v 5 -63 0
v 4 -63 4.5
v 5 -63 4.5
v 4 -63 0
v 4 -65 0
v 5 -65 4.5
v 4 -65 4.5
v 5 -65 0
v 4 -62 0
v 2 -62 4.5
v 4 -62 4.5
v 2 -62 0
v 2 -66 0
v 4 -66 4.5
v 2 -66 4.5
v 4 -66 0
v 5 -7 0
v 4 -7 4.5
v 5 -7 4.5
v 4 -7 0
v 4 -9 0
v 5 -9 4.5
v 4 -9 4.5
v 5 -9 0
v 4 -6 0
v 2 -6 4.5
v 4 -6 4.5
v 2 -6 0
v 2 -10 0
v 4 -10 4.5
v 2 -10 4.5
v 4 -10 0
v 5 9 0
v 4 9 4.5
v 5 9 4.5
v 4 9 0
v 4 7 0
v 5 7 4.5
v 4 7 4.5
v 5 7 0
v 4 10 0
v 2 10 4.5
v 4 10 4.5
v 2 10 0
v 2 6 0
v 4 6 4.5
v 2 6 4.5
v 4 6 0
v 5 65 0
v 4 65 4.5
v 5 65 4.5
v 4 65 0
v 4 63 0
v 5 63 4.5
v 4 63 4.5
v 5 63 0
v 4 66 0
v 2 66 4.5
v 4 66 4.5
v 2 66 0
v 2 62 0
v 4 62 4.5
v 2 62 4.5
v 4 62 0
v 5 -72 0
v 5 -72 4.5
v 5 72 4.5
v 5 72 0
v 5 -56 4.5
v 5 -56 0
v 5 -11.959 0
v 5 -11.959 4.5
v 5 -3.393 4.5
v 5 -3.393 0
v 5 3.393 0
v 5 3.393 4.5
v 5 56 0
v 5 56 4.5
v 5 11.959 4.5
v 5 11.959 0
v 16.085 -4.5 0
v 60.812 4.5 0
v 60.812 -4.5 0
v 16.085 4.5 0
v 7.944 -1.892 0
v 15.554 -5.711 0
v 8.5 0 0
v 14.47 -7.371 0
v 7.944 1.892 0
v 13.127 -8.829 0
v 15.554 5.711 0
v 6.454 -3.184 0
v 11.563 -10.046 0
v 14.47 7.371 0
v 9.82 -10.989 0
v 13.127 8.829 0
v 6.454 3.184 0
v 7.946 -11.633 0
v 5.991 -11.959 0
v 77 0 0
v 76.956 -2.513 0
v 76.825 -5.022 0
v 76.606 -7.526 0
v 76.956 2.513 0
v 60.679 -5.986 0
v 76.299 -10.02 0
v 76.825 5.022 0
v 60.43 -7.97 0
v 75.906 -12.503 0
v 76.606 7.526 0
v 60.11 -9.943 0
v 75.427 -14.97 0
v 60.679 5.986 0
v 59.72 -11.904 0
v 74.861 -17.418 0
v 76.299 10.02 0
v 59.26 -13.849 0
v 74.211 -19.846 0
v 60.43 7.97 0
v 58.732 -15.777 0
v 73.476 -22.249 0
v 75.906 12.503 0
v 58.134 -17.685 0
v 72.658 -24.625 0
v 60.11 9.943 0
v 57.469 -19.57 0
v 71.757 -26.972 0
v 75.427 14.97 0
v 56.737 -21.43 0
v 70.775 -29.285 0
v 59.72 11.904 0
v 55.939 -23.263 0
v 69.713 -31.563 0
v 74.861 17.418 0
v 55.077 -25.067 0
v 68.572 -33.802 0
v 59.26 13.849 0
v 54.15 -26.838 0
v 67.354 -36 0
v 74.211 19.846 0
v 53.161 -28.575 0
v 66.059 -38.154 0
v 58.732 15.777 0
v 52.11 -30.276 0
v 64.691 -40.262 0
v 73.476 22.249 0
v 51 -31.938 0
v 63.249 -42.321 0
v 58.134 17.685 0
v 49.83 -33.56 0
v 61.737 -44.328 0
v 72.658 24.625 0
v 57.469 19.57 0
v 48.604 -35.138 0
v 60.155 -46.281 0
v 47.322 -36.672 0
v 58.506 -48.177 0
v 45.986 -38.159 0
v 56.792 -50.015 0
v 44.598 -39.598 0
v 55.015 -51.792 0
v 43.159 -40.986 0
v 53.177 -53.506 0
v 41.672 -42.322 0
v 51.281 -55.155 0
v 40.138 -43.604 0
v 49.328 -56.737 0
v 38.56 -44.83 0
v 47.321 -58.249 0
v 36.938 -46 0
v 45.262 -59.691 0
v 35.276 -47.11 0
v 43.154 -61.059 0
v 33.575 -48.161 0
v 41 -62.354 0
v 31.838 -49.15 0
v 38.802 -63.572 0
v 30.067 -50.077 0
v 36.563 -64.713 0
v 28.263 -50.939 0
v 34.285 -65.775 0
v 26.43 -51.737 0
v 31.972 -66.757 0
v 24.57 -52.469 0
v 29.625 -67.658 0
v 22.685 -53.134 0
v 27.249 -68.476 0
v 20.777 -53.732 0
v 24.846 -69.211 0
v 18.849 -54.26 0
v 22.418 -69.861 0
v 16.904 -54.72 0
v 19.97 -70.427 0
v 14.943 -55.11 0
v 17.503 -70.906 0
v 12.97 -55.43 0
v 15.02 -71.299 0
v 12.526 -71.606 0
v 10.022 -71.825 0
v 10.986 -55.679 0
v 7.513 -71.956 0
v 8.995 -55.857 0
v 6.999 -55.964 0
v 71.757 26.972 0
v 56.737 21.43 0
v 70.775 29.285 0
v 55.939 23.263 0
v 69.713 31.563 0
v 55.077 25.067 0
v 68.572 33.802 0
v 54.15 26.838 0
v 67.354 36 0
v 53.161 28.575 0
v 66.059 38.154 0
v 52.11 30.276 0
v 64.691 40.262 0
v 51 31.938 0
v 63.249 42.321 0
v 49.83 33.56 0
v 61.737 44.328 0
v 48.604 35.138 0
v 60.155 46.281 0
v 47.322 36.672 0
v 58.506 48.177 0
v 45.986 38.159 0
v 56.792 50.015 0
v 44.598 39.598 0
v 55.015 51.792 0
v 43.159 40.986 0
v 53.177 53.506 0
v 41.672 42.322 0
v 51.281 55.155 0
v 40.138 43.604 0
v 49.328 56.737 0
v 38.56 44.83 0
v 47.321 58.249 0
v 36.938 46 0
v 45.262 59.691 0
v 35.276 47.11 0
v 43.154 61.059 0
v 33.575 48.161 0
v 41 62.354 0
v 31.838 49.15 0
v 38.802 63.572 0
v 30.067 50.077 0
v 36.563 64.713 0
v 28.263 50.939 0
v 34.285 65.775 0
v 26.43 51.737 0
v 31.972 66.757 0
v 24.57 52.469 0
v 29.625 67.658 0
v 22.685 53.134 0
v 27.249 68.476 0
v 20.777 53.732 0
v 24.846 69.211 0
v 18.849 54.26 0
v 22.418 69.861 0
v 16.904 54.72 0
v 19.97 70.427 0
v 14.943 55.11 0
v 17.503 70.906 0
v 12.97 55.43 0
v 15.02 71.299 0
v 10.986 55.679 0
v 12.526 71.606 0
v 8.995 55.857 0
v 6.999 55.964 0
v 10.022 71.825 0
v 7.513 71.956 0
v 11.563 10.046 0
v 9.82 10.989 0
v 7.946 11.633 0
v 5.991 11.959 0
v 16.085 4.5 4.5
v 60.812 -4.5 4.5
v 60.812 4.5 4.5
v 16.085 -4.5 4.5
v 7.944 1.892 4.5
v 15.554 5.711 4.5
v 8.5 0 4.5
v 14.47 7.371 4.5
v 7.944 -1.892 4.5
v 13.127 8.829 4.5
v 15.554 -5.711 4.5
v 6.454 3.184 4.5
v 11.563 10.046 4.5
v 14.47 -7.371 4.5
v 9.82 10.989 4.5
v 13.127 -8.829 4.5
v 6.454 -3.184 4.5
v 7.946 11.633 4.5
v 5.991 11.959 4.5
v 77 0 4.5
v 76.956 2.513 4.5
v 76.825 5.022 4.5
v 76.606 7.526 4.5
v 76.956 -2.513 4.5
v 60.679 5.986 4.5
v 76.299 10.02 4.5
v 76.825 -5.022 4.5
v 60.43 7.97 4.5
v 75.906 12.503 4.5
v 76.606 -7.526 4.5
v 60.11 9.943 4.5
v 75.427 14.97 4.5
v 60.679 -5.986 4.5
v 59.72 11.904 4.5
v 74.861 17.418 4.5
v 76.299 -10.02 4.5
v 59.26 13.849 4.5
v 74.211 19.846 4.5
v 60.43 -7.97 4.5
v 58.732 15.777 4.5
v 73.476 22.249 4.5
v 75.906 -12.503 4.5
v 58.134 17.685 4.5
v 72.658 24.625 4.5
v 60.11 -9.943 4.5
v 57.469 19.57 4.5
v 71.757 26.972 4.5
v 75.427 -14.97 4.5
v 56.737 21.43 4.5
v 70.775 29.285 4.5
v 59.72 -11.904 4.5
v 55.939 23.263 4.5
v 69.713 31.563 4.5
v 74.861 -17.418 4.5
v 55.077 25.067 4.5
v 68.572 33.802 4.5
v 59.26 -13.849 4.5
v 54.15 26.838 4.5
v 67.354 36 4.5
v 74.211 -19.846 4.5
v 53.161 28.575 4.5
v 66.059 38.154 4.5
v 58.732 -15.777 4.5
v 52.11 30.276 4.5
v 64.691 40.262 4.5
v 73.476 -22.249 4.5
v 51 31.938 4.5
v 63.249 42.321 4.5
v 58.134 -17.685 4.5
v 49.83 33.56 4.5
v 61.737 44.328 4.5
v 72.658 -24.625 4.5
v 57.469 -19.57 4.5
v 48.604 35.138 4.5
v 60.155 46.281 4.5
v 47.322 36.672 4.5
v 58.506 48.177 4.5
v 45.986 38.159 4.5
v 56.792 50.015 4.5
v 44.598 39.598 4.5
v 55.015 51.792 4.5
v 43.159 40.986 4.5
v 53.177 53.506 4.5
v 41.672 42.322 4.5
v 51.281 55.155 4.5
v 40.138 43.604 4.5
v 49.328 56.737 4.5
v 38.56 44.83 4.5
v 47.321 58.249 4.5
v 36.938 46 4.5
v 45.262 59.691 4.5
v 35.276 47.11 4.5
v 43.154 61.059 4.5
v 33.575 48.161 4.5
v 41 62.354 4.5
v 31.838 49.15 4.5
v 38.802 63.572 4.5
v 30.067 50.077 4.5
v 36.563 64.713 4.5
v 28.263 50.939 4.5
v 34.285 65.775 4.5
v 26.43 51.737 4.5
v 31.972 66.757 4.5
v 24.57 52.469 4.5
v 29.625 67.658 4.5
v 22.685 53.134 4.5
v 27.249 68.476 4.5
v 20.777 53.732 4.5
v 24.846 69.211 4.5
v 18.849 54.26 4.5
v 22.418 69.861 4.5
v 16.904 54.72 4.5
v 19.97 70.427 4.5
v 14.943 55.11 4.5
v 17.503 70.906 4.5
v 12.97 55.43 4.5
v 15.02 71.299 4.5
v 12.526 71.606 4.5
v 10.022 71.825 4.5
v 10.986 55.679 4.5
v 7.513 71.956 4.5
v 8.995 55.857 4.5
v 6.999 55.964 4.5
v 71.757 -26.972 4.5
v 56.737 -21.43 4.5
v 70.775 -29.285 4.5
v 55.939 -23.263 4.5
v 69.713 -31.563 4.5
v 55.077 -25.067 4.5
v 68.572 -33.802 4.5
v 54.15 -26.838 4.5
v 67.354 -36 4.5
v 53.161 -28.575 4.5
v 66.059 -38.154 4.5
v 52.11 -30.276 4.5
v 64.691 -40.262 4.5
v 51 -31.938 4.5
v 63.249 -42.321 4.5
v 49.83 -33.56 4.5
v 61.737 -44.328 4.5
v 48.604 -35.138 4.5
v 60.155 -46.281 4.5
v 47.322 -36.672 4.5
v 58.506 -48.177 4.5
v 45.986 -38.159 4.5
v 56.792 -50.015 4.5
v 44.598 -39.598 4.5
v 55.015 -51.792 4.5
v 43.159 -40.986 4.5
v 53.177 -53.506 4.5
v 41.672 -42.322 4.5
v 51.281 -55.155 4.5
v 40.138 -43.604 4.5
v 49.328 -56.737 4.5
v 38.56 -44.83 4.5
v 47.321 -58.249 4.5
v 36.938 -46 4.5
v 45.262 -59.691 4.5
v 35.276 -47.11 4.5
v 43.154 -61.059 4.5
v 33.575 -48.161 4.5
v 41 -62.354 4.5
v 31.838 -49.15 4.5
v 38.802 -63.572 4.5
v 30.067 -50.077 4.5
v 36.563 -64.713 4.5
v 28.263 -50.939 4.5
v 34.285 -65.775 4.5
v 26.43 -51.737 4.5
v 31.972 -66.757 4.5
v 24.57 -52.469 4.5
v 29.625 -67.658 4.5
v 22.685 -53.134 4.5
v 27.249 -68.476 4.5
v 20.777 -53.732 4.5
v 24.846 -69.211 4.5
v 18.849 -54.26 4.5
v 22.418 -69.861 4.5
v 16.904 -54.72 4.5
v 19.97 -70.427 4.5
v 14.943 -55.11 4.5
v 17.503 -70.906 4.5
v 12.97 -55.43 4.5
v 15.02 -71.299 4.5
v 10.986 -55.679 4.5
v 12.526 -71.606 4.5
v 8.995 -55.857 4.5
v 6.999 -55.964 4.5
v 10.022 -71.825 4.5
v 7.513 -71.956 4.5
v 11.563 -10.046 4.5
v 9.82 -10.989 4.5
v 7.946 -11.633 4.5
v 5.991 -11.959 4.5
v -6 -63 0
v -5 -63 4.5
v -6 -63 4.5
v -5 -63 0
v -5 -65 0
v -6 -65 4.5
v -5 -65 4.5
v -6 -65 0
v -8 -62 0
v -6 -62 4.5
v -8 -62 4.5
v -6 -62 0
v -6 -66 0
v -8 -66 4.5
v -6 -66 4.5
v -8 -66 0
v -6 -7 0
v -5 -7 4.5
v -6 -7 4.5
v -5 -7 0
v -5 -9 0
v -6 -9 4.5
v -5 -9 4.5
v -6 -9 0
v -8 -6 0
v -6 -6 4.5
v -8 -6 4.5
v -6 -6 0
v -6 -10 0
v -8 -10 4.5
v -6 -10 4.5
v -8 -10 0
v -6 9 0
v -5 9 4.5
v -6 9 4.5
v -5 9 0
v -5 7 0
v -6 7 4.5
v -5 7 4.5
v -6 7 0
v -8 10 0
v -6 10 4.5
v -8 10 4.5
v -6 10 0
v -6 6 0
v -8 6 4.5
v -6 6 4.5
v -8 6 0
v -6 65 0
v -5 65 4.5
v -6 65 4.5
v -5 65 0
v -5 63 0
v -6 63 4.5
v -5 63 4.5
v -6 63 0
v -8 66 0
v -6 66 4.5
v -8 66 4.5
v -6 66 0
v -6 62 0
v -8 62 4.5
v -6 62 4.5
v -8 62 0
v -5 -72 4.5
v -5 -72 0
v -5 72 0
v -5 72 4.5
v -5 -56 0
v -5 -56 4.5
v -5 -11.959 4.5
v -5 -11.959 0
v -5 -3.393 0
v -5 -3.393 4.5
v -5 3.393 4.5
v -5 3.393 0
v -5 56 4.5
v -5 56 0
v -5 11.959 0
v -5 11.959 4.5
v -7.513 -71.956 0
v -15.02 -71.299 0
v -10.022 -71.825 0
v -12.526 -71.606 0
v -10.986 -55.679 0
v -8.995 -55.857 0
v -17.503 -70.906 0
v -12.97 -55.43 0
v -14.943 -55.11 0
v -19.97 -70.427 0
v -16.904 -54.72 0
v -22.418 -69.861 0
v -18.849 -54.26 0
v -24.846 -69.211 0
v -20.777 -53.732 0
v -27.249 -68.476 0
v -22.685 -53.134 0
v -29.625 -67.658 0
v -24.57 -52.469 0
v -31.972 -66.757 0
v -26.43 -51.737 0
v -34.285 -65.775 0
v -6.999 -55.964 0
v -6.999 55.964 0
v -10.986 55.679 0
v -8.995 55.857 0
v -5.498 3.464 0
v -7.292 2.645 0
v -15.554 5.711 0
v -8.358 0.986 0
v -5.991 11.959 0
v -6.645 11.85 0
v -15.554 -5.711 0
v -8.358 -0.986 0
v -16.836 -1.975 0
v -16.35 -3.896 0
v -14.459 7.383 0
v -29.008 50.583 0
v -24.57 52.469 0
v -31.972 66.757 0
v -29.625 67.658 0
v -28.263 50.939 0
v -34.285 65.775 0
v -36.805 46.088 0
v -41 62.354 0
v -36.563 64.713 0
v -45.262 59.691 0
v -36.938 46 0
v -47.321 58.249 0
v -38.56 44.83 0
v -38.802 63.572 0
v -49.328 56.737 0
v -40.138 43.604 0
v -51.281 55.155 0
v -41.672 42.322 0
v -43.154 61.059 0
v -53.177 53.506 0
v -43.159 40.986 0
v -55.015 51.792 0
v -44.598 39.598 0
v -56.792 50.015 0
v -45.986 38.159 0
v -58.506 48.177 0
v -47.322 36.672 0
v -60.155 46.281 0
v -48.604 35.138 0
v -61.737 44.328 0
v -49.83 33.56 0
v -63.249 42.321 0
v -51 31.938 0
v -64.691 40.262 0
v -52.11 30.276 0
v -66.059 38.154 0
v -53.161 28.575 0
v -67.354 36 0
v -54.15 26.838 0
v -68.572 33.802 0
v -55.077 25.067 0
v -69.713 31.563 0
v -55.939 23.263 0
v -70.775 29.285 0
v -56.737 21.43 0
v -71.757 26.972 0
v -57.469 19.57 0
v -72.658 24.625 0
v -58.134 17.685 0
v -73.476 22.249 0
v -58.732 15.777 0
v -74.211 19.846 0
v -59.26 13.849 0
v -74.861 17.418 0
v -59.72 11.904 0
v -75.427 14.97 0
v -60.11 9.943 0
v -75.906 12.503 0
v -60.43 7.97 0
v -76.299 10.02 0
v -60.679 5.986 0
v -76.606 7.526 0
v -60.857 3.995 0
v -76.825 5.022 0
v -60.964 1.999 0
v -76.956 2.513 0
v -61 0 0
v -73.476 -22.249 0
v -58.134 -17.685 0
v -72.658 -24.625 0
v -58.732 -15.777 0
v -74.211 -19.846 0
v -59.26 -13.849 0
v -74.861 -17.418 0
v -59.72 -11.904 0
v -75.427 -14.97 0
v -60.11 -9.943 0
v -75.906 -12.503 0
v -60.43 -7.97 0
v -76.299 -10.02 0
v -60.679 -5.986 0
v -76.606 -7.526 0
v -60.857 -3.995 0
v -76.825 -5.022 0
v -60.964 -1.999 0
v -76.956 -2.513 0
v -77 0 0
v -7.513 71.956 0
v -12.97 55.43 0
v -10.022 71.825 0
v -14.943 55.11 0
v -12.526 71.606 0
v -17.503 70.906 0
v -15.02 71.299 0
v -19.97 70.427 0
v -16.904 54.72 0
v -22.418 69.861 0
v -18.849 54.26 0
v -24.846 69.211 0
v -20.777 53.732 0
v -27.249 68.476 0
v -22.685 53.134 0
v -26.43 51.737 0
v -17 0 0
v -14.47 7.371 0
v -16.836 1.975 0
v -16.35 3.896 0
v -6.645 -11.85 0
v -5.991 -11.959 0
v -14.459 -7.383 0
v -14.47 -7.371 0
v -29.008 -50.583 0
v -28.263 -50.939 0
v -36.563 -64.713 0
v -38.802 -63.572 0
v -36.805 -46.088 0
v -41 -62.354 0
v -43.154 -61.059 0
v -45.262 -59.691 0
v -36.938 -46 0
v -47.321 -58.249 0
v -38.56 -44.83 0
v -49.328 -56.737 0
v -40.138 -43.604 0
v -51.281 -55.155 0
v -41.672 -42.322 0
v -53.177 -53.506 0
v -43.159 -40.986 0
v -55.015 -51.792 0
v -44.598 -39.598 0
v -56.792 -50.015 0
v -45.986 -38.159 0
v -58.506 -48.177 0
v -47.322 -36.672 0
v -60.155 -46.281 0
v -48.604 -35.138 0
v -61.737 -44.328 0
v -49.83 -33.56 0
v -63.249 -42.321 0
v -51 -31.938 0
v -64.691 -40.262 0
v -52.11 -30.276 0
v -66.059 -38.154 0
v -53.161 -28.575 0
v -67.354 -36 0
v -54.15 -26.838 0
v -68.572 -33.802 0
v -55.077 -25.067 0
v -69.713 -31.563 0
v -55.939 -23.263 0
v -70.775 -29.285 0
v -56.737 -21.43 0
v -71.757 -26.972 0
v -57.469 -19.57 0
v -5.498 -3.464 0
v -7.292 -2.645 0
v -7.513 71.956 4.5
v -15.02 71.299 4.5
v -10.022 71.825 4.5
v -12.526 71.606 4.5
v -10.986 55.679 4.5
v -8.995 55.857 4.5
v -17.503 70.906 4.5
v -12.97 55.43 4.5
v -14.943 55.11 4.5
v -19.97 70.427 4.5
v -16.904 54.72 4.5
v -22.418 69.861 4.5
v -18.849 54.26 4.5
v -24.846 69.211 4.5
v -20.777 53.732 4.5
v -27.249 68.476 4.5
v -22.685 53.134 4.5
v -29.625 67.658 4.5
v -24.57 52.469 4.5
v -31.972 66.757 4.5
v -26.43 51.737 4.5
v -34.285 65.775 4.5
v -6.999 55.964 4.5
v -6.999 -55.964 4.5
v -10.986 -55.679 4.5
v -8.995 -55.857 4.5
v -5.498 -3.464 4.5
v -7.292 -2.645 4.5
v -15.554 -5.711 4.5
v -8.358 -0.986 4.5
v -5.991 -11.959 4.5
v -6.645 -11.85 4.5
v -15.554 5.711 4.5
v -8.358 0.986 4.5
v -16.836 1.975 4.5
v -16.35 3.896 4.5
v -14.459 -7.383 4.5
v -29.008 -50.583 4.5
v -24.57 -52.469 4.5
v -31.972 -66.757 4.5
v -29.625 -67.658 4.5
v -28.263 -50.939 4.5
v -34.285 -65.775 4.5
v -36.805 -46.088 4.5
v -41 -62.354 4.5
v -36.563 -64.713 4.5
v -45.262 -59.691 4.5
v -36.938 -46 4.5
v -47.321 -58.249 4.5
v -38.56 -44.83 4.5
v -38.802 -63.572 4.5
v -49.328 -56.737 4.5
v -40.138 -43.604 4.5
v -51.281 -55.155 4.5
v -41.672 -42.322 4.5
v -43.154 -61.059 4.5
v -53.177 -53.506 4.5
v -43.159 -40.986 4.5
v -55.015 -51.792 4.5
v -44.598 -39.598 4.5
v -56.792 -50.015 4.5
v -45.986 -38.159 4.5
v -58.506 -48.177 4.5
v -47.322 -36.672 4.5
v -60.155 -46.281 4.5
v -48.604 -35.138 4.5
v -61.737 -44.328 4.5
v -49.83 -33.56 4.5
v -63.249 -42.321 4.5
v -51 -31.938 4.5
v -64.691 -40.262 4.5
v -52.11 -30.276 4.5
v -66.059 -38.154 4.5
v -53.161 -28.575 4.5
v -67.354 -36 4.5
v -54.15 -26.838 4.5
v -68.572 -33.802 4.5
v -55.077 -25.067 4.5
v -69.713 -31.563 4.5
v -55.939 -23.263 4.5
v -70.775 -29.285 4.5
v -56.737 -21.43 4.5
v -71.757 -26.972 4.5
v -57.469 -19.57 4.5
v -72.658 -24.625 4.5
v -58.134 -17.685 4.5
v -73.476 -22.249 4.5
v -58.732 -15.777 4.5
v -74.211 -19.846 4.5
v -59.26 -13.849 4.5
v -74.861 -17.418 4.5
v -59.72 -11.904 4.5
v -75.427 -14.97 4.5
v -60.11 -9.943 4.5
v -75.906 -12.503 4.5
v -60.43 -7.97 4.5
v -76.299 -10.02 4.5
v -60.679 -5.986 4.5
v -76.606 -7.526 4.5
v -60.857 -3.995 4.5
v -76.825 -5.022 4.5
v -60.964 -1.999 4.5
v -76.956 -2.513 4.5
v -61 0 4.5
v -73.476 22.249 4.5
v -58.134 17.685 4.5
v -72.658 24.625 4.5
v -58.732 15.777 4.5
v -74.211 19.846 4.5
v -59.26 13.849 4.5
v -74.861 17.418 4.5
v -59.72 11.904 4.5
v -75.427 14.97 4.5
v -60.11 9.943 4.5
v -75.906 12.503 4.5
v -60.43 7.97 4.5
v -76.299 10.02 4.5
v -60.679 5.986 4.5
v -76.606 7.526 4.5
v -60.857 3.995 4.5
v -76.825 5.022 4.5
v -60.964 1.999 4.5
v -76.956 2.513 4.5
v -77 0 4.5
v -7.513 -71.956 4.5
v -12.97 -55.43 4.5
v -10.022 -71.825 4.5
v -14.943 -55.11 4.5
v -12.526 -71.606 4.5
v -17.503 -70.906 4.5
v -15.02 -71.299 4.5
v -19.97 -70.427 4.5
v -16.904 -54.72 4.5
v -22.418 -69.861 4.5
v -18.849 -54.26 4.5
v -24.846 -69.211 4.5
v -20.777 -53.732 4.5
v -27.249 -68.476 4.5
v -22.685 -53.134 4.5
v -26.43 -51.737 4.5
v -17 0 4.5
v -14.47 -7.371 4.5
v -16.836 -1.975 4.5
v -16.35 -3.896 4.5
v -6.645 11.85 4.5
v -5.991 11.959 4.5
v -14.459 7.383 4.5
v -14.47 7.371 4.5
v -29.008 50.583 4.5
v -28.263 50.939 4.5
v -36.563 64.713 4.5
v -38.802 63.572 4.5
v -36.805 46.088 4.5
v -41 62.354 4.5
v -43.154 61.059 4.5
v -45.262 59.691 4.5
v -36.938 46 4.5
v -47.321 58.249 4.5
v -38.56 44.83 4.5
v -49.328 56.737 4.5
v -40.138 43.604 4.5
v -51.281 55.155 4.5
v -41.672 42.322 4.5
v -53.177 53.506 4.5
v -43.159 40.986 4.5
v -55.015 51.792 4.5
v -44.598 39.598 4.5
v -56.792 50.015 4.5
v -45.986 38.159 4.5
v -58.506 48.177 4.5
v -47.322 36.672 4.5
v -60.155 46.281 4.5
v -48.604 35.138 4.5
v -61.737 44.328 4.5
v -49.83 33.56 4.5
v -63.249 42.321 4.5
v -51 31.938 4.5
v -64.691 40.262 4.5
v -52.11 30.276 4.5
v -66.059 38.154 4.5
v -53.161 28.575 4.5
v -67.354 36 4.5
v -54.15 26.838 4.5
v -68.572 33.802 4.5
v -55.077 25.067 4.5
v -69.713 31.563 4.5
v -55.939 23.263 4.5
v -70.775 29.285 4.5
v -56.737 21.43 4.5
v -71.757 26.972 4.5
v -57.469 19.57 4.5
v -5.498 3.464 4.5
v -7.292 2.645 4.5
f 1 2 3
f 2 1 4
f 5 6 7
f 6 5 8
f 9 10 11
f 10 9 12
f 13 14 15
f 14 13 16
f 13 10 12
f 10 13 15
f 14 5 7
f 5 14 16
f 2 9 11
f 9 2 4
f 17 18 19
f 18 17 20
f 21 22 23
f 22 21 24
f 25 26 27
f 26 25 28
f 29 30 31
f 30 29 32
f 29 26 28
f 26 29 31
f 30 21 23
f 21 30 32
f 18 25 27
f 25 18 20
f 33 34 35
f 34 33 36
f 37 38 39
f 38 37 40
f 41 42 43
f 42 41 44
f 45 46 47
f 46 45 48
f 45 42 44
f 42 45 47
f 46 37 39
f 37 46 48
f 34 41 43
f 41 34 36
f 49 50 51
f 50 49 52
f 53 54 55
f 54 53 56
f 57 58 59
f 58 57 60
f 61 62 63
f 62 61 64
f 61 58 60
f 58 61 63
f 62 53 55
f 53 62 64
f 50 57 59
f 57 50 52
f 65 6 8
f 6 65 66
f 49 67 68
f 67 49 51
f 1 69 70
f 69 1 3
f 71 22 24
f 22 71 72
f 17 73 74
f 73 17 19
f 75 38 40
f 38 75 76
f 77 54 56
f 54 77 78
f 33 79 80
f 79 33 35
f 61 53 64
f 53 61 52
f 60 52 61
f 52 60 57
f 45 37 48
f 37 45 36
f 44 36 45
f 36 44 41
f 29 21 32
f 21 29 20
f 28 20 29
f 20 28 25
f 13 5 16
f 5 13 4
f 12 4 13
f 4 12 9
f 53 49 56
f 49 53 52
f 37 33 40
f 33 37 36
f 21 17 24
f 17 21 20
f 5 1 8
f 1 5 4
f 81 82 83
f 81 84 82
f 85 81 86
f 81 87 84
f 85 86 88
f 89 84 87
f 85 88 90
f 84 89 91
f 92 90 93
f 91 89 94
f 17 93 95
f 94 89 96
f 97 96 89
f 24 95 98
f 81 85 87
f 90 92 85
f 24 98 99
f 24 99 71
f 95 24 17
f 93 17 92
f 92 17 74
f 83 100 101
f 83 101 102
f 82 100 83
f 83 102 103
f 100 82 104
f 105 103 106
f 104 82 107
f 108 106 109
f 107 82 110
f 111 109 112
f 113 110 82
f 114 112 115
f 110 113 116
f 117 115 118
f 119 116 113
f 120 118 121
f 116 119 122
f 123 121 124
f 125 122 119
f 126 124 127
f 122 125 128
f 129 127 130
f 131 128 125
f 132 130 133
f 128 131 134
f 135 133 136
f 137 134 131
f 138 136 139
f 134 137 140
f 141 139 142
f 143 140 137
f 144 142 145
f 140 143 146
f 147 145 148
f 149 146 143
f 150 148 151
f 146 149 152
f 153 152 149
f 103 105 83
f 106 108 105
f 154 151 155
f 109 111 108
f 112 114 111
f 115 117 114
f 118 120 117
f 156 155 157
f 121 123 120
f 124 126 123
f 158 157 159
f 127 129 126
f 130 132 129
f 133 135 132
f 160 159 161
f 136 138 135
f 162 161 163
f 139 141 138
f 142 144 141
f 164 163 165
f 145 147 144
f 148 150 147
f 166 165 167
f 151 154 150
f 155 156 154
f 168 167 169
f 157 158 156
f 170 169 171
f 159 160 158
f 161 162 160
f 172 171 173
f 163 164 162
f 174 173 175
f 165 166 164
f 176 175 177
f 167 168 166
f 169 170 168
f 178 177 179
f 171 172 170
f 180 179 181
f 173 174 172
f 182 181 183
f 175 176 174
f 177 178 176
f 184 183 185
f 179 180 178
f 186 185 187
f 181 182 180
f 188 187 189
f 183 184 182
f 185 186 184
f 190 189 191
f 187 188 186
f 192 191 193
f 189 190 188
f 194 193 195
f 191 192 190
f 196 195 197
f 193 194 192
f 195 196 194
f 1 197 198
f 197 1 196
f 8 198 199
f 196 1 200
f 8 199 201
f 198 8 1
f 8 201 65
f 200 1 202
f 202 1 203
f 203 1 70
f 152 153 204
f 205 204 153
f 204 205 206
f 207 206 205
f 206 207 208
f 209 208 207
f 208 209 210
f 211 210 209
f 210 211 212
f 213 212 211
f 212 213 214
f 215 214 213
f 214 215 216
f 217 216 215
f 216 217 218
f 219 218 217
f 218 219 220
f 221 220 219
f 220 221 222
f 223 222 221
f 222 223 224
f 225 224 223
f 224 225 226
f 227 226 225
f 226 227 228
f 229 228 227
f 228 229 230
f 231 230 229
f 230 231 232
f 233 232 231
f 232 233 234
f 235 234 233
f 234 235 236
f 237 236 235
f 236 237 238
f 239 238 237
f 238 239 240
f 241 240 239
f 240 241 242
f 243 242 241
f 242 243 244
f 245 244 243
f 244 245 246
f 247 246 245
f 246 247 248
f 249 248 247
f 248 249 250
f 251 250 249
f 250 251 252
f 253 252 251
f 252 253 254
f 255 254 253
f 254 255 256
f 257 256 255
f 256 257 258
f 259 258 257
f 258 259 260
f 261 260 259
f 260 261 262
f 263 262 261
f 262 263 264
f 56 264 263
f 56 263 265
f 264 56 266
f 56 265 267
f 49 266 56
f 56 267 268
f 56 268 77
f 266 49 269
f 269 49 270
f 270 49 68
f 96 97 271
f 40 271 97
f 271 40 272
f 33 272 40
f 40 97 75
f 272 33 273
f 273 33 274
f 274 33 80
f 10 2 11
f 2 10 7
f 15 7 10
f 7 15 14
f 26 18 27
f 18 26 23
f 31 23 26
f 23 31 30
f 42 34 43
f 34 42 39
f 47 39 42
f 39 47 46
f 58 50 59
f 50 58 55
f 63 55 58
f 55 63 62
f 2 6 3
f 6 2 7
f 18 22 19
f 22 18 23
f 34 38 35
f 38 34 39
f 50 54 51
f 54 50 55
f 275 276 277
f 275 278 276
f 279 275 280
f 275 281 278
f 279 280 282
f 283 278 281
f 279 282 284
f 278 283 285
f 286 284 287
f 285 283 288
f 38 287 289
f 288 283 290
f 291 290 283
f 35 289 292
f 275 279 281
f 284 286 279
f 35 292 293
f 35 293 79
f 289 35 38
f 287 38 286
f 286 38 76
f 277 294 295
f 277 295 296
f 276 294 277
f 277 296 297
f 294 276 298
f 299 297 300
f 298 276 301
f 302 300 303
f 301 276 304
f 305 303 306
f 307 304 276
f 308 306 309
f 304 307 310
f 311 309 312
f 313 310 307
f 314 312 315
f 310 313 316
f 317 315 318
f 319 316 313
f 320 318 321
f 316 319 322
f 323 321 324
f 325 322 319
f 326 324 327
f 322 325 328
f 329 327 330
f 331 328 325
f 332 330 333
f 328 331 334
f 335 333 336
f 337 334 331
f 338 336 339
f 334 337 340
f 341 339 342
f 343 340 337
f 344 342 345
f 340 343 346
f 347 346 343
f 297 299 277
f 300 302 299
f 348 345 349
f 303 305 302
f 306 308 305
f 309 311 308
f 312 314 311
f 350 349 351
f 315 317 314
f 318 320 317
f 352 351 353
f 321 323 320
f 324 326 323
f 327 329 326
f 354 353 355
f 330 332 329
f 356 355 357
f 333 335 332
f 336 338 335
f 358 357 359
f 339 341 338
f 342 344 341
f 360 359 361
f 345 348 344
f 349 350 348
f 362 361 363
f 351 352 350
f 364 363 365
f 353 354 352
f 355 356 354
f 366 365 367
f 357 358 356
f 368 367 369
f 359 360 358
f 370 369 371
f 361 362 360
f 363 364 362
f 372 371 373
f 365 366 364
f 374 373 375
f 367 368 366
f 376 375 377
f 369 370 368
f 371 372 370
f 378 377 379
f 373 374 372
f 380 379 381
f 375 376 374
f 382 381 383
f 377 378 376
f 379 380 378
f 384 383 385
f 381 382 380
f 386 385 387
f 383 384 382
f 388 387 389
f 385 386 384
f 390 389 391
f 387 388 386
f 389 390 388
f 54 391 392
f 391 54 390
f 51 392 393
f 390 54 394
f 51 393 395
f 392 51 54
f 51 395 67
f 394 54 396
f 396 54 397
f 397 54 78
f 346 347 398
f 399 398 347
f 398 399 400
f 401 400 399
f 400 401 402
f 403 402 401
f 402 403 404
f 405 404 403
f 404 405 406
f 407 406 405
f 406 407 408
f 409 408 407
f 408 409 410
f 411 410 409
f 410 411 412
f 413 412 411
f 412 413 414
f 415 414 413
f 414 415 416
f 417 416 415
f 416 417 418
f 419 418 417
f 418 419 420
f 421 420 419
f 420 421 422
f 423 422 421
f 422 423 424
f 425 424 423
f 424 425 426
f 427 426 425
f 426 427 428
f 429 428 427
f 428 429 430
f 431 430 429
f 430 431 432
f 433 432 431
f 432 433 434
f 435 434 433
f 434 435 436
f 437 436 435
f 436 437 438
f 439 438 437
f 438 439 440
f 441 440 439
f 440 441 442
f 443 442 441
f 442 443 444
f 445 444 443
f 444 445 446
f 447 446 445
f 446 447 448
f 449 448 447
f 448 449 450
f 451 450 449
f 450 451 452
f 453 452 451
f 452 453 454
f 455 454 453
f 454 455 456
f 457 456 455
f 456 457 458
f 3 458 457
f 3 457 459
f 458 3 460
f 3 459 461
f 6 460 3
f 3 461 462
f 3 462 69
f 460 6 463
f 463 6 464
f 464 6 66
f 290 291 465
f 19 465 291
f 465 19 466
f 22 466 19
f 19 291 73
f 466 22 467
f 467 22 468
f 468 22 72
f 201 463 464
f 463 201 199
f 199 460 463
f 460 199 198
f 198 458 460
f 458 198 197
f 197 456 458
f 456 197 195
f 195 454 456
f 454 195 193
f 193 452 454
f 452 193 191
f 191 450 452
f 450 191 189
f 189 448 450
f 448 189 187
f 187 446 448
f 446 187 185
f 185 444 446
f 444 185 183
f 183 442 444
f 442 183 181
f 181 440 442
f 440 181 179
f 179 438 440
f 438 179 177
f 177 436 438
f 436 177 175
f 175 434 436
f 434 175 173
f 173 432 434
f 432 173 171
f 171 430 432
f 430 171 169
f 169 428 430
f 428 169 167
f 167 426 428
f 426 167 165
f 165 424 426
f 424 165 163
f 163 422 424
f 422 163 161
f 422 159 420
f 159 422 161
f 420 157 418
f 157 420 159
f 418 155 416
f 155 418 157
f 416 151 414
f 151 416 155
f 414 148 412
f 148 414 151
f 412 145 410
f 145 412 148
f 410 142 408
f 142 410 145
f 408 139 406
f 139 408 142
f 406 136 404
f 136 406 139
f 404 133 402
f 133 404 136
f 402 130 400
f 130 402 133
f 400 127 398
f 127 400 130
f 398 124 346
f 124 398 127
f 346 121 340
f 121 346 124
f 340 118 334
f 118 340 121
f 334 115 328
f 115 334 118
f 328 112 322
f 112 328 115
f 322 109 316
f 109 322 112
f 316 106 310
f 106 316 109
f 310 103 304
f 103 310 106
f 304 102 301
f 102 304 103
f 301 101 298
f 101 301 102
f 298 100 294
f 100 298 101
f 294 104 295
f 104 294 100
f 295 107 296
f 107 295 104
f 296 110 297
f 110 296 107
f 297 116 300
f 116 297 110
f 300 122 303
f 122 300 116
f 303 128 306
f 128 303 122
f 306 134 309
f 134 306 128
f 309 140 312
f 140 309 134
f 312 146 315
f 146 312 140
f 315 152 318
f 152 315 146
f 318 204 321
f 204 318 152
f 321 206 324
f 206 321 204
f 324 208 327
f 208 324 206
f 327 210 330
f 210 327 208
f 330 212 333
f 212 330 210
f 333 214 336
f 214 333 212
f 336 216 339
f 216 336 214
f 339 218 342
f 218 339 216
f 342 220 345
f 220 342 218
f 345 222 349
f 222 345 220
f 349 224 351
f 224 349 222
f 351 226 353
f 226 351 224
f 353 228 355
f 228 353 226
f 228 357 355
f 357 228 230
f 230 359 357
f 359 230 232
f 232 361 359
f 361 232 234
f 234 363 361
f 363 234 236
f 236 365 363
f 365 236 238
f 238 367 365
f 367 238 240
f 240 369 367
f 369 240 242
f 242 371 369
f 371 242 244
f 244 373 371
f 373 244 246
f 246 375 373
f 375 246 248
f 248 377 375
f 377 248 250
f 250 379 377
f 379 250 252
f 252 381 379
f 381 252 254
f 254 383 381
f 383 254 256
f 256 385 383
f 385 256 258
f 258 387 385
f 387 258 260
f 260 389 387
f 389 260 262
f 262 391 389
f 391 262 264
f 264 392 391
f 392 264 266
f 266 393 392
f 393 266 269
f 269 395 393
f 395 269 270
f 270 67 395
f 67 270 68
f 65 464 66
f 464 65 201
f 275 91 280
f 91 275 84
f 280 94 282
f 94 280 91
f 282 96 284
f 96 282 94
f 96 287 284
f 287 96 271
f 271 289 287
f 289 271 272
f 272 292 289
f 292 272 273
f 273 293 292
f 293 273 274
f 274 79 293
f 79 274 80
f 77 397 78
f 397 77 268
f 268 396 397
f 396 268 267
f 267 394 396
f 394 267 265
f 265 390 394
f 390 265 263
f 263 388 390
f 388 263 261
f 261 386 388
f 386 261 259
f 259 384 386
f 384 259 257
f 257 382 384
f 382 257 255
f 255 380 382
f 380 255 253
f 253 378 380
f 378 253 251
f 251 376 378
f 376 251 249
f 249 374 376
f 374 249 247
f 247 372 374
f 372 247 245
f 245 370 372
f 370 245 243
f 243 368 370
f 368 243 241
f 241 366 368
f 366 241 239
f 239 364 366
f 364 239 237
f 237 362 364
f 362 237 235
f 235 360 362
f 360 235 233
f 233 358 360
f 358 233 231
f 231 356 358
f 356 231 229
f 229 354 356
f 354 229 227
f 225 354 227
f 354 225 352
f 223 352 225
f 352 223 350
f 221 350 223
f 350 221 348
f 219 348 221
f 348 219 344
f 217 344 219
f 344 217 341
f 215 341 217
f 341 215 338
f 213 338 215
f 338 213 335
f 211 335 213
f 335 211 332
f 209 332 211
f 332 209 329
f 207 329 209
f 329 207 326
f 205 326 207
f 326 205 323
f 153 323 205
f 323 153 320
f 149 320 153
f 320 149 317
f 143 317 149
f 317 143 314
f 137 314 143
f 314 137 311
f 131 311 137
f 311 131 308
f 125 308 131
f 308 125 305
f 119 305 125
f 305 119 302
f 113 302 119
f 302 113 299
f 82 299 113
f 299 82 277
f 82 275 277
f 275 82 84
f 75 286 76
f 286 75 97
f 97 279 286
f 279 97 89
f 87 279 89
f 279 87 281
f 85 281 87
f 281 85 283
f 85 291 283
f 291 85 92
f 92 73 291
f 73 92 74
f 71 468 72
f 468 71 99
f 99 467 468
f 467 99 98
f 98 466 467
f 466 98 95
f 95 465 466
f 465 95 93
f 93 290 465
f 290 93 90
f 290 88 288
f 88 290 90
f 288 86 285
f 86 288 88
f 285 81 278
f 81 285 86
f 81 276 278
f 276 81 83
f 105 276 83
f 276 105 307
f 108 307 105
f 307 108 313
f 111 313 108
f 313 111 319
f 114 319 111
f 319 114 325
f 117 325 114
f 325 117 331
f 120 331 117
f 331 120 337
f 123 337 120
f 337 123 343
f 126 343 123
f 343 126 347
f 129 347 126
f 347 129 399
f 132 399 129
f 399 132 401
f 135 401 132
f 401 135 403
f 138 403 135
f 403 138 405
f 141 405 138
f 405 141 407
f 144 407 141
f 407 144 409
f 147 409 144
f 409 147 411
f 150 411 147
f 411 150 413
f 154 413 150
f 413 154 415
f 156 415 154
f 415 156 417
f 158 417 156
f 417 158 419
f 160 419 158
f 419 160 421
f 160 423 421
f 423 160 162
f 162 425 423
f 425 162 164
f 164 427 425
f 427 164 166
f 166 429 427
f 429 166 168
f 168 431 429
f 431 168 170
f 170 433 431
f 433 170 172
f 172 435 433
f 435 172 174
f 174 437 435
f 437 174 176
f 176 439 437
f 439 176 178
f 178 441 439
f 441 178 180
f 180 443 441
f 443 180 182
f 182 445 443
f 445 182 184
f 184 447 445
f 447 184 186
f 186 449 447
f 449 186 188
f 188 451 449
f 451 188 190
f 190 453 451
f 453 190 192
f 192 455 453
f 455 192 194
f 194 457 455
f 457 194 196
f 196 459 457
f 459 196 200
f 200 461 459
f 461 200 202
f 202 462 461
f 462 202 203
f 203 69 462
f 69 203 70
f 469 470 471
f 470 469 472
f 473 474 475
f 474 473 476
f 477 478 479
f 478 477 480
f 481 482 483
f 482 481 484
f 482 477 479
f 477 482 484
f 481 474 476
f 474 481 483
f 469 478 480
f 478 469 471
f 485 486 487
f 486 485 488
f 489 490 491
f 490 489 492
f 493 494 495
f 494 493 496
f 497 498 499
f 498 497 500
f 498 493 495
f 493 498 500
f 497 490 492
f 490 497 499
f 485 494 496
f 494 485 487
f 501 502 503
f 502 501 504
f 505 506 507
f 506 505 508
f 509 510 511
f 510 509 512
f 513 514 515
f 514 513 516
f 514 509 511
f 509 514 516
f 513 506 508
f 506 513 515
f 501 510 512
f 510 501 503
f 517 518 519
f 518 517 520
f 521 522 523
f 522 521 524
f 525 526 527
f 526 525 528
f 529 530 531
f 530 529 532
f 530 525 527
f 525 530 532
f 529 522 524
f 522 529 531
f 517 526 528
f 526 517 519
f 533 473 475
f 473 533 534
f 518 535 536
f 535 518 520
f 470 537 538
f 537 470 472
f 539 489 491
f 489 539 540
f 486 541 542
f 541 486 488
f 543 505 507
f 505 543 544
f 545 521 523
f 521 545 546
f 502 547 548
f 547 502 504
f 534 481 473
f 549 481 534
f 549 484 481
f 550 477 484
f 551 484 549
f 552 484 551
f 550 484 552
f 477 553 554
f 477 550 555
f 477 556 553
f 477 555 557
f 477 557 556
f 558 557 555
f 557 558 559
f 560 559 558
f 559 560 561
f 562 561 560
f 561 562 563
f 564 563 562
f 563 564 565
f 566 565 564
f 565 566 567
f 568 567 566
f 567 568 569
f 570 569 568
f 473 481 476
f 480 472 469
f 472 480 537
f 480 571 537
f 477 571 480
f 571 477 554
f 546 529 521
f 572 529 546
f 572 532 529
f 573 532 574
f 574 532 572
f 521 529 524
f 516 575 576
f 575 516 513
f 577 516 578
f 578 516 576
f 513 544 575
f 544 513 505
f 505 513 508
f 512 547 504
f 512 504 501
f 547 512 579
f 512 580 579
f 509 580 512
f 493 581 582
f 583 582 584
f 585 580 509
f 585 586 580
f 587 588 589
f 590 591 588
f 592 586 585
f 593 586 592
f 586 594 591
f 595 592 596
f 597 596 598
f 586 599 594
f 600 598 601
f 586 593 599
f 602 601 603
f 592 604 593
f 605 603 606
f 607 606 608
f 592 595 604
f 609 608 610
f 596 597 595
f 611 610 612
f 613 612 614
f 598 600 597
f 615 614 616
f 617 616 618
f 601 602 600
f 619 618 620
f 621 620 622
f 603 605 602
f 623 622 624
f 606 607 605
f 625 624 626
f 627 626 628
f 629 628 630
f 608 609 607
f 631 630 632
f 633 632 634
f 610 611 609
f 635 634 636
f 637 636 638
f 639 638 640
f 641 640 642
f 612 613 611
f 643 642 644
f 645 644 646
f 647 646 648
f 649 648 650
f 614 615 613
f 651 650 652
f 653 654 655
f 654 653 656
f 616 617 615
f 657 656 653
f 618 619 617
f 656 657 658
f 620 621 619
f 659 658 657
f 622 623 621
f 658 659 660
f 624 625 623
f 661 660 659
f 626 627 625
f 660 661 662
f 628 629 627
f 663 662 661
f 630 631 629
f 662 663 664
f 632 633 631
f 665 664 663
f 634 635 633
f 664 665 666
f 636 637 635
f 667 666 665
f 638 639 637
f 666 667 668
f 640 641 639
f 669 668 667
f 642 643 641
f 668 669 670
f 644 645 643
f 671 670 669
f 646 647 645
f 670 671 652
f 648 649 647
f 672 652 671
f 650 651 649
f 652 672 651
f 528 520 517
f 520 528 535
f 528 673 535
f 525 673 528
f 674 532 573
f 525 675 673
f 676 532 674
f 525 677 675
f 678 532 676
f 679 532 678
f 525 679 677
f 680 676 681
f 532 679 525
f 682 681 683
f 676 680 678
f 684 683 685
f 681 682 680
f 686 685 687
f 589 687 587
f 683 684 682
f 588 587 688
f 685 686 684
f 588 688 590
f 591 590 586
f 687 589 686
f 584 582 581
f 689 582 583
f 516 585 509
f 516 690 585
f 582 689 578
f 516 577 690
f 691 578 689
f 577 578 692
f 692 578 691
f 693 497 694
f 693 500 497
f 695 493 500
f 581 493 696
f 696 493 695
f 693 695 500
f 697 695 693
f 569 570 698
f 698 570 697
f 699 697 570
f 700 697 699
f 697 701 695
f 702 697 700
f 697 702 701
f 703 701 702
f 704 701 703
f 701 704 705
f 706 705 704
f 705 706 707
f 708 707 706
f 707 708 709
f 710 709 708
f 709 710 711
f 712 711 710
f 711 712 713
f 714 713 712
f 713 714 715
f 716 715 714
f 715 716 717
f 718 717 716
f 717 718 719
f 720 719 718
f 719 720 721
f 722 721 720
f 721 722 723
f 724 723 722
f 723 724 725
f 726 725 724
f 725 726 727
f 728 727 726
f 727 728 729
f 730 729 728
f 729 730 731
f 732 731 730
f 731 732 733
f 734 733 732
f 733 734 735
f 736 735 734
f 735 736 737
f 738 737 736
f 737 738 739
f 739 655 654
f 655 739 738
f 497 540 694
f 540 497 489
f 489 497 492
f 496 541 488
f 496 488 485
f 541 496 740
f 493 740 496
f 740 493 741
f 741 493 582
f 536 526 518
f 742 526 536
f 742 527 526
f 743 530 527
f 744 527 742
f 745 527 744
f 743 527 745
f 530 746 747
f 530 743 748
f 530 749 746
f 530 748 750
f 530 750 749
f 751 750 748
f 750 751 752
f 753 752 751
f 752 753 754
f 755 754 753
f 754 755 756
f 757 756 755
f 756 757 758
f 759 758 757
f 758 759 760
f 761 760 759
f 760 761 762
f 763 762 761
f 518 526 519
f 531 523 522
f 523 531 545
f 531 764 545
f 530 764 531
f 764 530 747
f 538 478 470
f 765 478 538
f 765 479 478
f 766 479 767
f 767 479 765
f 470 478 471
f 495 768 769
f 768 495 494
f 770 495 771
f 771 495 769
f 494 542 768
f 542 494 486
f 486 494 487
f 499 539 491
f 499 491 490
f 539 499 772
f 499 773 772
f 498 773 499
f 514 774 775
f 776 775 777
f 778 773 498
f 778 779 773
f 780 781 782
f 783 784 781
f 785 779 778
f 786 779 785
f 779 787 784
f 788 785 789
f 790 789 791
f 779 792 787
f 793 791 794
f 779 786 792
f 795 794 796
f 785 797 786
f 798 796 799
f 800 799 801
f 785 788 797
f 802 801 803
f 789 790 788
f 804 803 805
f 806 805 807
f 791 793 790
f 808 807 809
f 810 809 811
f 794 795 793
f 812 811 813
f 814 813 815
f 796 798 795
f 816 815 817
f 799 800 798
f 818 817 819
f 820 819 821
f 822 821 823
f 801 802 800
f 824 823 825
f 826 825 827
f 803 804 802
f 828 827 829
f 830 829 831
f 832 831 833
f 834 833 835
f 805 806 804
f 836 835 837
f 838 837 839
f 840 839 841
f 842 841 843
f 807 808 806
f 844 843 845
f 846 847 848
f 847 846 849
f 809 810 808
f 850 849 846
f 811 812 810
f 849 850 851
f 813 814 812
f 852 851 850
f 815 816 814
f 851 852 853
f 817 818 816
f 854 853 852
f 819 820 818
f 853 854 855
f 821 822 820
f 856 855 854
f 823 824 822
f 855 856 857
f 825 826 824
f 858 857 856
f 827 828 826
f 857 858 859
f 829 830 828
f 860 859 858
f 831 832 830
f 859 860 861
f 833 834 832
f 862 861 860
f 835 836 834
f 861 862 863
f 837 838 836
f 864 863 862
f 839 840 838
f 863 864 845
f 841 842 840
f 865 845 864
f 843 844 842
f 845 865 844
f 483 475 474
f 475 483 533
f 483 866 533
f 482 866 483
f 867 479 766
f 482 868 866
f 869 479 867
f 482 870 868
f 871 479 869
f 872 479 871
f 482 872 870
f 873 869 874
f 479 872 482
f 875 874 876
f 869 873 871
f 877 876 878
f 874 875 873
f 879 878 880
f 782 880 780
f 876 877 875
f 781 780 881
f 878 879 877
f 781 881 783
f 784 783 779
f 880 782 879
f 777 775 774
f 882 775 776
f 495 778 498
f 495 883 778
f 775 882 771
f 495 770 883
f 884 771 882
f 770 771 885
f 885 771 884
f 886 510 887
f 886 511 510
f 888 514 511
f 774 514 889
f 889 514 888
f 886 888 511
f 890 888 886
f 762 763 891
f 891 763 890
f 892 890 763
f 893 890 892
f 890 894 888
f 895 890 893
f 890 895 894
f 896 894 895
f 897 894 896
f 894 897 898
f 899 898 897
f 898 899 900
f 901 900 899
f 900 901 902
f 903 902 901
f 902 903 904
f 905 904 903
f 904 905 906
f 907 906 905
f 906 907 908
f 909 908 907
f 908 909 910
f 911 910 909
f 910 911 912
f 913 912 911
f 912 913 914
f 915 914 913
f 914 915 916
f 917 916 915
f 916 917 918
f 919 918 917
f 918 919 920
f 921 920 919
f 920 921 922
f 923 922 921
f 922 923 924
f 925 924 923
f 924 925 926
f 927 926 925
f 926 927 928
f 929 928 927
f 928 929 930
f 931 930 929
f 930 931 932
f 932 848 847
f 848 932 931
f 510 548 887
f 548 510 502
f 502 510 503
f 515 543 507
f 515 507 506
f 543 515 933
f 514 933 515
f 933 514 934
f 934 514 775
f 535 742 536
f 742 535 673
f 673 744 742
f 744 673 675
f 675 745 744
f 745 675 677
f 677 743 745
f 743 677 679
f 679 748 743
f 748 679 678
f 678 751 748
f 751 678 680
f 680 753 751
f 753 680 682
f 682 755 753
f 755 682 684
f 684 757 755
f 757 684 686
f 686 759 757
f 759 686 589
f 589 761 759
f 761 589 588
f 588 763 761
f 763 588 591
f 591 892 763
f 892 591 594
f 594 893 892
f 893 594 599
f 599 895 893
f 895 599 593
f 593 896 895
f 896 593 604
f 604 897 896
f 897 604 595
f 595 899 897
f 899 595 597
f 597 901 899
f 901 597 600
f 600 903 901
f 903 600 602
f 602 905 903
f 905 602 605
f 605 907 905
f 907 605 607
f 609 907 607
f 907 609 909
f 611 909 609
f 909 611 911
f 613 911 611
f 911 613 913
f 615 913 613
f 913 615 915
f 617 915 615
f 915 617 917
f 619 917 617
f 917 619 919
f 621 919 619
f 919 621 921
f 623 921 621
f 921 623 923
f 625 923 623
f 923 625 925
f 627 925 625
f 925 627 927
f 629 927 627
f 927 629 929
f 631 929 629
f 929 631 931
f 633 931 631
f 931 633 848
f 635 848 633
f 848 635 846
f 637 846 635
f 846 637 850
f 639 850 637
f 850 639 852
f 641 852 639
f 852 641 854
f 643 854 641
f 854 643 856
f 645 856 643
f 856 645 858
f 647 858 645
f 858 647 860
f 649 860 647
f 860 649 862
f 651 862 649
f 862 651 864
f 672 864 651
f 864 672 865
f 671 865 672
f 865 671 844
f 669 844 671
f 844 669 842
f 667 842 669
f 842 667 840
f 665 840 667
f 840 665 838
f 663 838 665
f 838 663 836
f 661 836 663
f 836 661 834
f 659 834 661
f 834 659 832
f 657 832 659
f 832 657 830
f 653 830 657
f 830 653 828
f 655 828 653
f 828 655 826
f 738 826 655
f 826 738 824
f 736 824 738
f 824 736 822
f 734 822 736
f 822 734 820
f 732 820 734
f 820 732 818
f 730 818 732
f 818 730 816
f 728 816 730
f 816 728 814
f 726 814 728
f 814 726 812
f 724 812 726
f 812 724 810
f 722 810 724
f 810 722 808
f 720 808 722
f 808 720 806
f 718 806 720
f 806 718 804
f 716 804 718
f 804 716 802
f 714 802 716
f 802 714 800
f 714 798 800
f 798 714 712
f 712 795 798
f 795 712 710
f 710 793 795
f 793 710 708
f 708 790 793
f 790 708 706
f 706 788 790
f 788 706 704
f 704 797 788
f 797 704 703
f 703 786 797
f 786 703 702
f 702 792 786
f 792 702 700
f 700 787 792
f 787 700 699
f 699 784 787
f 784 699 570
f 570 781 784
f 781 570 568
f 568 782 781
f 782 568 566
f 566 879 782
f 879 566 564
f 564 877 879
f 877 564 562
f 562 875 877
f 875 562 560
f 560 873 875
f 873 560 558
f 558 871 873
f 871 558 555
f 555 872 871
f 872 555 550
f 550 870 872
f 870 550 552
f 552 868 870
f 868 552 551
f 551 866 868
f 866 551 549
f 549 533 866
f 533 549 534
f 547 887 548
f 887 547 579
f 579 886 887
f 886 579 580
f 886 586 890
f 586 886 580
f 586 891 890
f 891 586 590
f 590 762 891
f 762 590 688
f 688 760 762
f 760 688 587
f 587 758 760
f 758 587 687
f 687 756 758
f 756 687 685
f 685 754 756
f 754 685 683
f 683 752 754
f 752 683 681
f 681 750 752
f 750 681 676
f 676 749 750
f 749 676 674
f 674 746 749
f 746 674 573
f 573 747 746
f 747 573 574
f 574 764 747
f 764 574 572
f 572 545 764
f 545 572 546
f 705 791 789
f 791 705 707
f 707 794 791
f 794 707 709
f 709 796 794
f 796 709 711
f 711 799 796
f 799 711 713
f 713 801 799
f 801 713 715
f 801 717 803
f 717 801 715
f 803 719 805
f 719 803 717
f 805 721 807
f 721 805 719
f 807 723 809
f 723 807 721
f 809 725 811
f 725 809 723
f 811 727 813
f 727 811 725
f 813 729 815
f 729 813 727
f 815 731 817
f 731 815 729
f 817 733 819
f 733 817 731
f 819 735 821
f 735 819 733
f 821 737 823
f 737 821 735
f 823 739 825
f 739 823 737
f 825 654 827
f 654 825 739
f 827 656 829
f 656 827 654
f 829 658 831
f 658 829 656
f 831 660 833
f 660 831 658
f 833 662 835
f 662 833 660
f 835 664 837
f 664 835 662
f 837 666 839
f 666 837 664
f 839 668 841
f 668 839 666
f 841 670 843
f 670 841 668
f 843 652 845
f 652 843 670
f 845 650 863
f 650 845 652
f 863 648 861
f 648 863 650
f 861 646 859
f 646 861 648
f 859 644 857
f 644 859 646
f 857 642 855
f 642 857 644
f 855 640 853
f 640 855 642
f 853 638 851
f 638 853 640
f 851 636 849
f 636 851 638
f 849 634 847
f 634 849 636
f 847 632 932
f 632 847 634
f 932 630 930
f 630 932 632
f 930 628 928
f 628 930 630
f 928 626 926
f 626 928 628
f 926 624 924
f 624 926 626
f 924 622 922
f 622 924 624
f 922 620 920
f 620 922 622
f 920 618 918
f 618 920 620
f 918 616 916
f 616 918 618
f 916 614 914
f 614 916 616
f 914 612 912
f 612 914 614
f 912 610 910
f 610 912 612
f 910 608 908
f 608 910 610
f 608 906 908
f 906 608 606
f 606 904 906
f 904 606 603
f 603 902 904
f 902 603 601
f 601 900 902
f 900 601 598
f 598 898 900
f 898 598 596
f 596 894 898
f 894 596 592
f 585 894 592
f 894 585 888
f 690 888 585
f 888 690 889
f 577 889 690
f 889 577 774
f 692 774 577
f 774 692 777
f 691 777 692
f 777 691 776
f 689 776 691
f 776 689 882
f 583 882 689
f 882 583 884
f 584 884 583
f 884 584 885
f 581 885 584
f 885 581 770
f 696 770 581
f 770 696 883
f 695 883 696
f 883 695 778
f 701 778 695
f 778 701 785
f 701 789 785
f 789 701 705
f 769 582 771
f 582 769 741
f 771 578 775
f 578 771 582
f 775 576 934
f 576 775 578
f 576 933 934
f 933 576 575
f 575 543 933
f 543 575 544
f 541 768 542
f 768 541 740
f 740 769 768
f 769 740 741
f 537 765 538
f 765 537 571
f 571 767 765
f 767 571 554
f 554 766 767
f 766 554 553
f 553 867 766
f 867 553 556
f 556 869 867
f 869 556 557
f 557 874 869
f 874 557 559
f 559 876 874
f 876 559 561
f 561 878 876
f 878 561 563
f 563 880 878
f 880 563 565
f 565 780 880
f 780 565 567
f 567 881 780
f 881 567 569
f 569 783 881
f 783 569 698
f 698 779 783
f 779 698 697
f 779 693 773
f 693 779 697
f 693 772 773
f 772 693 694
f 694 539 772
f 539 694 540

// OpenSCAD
// file: demoobject.scad
outsideCircle = 72;
platformWidth = 16;
platformDepth = 4.5;
supportBeamWidth = 9;
supportCenterCircleRadius = 12;
centerHoleRadius = 3.5;

$fs = 2;
$fa = 2;

module drawDemoObject()
{

	linear_extrude(height = platformDepth) supportPlatform();

}

module beams()
{
		circle(supportCenterCircleRadius);
		translate ([0,-supportBeamWidth / 2, 0]) square([outsideCircle - platformWidth, supportBeamWidth]);
		rotate ([0,0,120]) translate ([0,-supportBeamWidth / 2, 0]) square([outsideCircle - platformWidth, supportBeamWidth]);
		rotate ([0,0,240]) translate ([0,-supportBeamWidth / 2, 0]) square([outsideCircle - platformWidth, supportBeamWidth]);
}

module supportPlatform()
{
	difference()
	{
		beams();
		circle(centerHoleRadius);
	}
	
	difference()
	{
		circle(outsideCircle);
		circle(outsideCircle - platformWidth);
	}
}
// file: puzzlecutlib.scad
//OpenSCAD PuzzleCut Library Demo - by Rich Olson
//http://www.nothinglabs.com
//Tested on build 2012.08.22
//License: http://creativecommons.org/licenses/by/3.0/


module xMaleCut(offset = 0, cut = xCut1)
{
	difference()
	{
		child(0);	
		translate([0,offset,0]) makePuzzleStamp(cutLocations = cut);
	}
}


module xFemaleCut(offset = 0, cut = xCut1)
{
	intersection()
	{
		child(0);
		translate([0,offset,0]) makePuzzleStamp(cutLocations = cut,
			 kerf = kerf);	//only set kerf on female side
	}
}


module yMaleCut(offset = 0, cut = yCut1)
{
	difference()
	{
		child(0);	
		rotate ([0,0,90]) translate([0,offset,0]) makePuzzleStamp(cutLocations = cut);
	}
}


module yFemaleCut(offset = 0, cut = yCut1)
{
	intersection()
	{
		child(0);
		rotate ([0,0,90]) translate([0,offset,0]) makePuzzleStamp(cutLocations = cut,
			 kerf = kerf);	//only set kerf on female side
	}
}



module makePuzzleStamp(kerf = 0)
{
	difference()
	{
		//make the cube
		translate ([0,stampSize[0] / 2 - kerf,0])
			cube (stampSize, center = true);
		
		//make the cuts
		for ( i = cutLocations )
		{
			translate([i,0,0])
				cube ([(cutSize / 2) - kerf * 2, cutSize - kerf * 2,stampSize[2]], center = true);
			translate([i,cutSize / 2,0])
				cube ([cutSize - kerf *  2,(cutSize / 2) - kerf * 2, stampSize[2]], center = true);
		}		
	}
}
// main file
//OpenSCAD PuzzleCut Library Demo - by Rich Olson
//http://www.nothinglabs.com
//Tested on build 2012.08.22
//License: http://creativecommons.org/licenses/by/3.0/

//NOTE: Complex objects may result in "normalized tree" errors / rendering problems
//These can be worked around by doing a full render (just hit F6)

include <puzzlecutlib.scad>
include <demoobject.scad>

stampSize = [500,500,100];		//size of cutting stamp (should cover 1/2 of object)

cutSize = 4;	//size of the puzzle cuts

xCut1 = [-64, -8, 8, 27, 45, 64];	//locations of puzzle cuts relative to X axis center
yCut1 = [-64, -8, 8, 64];				//for Y axis

kerf = 0;		//supports +/- numbers (greater value = tighter fit)
					//using a small negative number may be useful to assure easy fit for 3d printing
					//using positive values useful for lasercutting
					//negative values can also help visualize cuts without seperating pieces

cutInTwo(); //cuts in two along y axis
//cutInFour();  //cuts in four along x / y axis

//comment out lines as needed to render individual pieces

module cutInTwo()
{
	translate([5,0,0])
		yMaleCut() drawDemoObject();

	translate([-5,0,0])
		yFemaleCut() drawDemoObject();
}

module cutInFour()
{
	translate([5,-5,0])
		xMaleCut() yMaleCut() drawDemoObject();

	translate([-5,-5,0])
		xMaleCut() yFemaleCut() drawDemoObject();

	translate([5,5,0])
		xFemaleCut() yMaleCut() drawDemoObject();

	translate([-5,5,0])
		xFemaleCut() yFemaleCut() drawDemoObject();
}
